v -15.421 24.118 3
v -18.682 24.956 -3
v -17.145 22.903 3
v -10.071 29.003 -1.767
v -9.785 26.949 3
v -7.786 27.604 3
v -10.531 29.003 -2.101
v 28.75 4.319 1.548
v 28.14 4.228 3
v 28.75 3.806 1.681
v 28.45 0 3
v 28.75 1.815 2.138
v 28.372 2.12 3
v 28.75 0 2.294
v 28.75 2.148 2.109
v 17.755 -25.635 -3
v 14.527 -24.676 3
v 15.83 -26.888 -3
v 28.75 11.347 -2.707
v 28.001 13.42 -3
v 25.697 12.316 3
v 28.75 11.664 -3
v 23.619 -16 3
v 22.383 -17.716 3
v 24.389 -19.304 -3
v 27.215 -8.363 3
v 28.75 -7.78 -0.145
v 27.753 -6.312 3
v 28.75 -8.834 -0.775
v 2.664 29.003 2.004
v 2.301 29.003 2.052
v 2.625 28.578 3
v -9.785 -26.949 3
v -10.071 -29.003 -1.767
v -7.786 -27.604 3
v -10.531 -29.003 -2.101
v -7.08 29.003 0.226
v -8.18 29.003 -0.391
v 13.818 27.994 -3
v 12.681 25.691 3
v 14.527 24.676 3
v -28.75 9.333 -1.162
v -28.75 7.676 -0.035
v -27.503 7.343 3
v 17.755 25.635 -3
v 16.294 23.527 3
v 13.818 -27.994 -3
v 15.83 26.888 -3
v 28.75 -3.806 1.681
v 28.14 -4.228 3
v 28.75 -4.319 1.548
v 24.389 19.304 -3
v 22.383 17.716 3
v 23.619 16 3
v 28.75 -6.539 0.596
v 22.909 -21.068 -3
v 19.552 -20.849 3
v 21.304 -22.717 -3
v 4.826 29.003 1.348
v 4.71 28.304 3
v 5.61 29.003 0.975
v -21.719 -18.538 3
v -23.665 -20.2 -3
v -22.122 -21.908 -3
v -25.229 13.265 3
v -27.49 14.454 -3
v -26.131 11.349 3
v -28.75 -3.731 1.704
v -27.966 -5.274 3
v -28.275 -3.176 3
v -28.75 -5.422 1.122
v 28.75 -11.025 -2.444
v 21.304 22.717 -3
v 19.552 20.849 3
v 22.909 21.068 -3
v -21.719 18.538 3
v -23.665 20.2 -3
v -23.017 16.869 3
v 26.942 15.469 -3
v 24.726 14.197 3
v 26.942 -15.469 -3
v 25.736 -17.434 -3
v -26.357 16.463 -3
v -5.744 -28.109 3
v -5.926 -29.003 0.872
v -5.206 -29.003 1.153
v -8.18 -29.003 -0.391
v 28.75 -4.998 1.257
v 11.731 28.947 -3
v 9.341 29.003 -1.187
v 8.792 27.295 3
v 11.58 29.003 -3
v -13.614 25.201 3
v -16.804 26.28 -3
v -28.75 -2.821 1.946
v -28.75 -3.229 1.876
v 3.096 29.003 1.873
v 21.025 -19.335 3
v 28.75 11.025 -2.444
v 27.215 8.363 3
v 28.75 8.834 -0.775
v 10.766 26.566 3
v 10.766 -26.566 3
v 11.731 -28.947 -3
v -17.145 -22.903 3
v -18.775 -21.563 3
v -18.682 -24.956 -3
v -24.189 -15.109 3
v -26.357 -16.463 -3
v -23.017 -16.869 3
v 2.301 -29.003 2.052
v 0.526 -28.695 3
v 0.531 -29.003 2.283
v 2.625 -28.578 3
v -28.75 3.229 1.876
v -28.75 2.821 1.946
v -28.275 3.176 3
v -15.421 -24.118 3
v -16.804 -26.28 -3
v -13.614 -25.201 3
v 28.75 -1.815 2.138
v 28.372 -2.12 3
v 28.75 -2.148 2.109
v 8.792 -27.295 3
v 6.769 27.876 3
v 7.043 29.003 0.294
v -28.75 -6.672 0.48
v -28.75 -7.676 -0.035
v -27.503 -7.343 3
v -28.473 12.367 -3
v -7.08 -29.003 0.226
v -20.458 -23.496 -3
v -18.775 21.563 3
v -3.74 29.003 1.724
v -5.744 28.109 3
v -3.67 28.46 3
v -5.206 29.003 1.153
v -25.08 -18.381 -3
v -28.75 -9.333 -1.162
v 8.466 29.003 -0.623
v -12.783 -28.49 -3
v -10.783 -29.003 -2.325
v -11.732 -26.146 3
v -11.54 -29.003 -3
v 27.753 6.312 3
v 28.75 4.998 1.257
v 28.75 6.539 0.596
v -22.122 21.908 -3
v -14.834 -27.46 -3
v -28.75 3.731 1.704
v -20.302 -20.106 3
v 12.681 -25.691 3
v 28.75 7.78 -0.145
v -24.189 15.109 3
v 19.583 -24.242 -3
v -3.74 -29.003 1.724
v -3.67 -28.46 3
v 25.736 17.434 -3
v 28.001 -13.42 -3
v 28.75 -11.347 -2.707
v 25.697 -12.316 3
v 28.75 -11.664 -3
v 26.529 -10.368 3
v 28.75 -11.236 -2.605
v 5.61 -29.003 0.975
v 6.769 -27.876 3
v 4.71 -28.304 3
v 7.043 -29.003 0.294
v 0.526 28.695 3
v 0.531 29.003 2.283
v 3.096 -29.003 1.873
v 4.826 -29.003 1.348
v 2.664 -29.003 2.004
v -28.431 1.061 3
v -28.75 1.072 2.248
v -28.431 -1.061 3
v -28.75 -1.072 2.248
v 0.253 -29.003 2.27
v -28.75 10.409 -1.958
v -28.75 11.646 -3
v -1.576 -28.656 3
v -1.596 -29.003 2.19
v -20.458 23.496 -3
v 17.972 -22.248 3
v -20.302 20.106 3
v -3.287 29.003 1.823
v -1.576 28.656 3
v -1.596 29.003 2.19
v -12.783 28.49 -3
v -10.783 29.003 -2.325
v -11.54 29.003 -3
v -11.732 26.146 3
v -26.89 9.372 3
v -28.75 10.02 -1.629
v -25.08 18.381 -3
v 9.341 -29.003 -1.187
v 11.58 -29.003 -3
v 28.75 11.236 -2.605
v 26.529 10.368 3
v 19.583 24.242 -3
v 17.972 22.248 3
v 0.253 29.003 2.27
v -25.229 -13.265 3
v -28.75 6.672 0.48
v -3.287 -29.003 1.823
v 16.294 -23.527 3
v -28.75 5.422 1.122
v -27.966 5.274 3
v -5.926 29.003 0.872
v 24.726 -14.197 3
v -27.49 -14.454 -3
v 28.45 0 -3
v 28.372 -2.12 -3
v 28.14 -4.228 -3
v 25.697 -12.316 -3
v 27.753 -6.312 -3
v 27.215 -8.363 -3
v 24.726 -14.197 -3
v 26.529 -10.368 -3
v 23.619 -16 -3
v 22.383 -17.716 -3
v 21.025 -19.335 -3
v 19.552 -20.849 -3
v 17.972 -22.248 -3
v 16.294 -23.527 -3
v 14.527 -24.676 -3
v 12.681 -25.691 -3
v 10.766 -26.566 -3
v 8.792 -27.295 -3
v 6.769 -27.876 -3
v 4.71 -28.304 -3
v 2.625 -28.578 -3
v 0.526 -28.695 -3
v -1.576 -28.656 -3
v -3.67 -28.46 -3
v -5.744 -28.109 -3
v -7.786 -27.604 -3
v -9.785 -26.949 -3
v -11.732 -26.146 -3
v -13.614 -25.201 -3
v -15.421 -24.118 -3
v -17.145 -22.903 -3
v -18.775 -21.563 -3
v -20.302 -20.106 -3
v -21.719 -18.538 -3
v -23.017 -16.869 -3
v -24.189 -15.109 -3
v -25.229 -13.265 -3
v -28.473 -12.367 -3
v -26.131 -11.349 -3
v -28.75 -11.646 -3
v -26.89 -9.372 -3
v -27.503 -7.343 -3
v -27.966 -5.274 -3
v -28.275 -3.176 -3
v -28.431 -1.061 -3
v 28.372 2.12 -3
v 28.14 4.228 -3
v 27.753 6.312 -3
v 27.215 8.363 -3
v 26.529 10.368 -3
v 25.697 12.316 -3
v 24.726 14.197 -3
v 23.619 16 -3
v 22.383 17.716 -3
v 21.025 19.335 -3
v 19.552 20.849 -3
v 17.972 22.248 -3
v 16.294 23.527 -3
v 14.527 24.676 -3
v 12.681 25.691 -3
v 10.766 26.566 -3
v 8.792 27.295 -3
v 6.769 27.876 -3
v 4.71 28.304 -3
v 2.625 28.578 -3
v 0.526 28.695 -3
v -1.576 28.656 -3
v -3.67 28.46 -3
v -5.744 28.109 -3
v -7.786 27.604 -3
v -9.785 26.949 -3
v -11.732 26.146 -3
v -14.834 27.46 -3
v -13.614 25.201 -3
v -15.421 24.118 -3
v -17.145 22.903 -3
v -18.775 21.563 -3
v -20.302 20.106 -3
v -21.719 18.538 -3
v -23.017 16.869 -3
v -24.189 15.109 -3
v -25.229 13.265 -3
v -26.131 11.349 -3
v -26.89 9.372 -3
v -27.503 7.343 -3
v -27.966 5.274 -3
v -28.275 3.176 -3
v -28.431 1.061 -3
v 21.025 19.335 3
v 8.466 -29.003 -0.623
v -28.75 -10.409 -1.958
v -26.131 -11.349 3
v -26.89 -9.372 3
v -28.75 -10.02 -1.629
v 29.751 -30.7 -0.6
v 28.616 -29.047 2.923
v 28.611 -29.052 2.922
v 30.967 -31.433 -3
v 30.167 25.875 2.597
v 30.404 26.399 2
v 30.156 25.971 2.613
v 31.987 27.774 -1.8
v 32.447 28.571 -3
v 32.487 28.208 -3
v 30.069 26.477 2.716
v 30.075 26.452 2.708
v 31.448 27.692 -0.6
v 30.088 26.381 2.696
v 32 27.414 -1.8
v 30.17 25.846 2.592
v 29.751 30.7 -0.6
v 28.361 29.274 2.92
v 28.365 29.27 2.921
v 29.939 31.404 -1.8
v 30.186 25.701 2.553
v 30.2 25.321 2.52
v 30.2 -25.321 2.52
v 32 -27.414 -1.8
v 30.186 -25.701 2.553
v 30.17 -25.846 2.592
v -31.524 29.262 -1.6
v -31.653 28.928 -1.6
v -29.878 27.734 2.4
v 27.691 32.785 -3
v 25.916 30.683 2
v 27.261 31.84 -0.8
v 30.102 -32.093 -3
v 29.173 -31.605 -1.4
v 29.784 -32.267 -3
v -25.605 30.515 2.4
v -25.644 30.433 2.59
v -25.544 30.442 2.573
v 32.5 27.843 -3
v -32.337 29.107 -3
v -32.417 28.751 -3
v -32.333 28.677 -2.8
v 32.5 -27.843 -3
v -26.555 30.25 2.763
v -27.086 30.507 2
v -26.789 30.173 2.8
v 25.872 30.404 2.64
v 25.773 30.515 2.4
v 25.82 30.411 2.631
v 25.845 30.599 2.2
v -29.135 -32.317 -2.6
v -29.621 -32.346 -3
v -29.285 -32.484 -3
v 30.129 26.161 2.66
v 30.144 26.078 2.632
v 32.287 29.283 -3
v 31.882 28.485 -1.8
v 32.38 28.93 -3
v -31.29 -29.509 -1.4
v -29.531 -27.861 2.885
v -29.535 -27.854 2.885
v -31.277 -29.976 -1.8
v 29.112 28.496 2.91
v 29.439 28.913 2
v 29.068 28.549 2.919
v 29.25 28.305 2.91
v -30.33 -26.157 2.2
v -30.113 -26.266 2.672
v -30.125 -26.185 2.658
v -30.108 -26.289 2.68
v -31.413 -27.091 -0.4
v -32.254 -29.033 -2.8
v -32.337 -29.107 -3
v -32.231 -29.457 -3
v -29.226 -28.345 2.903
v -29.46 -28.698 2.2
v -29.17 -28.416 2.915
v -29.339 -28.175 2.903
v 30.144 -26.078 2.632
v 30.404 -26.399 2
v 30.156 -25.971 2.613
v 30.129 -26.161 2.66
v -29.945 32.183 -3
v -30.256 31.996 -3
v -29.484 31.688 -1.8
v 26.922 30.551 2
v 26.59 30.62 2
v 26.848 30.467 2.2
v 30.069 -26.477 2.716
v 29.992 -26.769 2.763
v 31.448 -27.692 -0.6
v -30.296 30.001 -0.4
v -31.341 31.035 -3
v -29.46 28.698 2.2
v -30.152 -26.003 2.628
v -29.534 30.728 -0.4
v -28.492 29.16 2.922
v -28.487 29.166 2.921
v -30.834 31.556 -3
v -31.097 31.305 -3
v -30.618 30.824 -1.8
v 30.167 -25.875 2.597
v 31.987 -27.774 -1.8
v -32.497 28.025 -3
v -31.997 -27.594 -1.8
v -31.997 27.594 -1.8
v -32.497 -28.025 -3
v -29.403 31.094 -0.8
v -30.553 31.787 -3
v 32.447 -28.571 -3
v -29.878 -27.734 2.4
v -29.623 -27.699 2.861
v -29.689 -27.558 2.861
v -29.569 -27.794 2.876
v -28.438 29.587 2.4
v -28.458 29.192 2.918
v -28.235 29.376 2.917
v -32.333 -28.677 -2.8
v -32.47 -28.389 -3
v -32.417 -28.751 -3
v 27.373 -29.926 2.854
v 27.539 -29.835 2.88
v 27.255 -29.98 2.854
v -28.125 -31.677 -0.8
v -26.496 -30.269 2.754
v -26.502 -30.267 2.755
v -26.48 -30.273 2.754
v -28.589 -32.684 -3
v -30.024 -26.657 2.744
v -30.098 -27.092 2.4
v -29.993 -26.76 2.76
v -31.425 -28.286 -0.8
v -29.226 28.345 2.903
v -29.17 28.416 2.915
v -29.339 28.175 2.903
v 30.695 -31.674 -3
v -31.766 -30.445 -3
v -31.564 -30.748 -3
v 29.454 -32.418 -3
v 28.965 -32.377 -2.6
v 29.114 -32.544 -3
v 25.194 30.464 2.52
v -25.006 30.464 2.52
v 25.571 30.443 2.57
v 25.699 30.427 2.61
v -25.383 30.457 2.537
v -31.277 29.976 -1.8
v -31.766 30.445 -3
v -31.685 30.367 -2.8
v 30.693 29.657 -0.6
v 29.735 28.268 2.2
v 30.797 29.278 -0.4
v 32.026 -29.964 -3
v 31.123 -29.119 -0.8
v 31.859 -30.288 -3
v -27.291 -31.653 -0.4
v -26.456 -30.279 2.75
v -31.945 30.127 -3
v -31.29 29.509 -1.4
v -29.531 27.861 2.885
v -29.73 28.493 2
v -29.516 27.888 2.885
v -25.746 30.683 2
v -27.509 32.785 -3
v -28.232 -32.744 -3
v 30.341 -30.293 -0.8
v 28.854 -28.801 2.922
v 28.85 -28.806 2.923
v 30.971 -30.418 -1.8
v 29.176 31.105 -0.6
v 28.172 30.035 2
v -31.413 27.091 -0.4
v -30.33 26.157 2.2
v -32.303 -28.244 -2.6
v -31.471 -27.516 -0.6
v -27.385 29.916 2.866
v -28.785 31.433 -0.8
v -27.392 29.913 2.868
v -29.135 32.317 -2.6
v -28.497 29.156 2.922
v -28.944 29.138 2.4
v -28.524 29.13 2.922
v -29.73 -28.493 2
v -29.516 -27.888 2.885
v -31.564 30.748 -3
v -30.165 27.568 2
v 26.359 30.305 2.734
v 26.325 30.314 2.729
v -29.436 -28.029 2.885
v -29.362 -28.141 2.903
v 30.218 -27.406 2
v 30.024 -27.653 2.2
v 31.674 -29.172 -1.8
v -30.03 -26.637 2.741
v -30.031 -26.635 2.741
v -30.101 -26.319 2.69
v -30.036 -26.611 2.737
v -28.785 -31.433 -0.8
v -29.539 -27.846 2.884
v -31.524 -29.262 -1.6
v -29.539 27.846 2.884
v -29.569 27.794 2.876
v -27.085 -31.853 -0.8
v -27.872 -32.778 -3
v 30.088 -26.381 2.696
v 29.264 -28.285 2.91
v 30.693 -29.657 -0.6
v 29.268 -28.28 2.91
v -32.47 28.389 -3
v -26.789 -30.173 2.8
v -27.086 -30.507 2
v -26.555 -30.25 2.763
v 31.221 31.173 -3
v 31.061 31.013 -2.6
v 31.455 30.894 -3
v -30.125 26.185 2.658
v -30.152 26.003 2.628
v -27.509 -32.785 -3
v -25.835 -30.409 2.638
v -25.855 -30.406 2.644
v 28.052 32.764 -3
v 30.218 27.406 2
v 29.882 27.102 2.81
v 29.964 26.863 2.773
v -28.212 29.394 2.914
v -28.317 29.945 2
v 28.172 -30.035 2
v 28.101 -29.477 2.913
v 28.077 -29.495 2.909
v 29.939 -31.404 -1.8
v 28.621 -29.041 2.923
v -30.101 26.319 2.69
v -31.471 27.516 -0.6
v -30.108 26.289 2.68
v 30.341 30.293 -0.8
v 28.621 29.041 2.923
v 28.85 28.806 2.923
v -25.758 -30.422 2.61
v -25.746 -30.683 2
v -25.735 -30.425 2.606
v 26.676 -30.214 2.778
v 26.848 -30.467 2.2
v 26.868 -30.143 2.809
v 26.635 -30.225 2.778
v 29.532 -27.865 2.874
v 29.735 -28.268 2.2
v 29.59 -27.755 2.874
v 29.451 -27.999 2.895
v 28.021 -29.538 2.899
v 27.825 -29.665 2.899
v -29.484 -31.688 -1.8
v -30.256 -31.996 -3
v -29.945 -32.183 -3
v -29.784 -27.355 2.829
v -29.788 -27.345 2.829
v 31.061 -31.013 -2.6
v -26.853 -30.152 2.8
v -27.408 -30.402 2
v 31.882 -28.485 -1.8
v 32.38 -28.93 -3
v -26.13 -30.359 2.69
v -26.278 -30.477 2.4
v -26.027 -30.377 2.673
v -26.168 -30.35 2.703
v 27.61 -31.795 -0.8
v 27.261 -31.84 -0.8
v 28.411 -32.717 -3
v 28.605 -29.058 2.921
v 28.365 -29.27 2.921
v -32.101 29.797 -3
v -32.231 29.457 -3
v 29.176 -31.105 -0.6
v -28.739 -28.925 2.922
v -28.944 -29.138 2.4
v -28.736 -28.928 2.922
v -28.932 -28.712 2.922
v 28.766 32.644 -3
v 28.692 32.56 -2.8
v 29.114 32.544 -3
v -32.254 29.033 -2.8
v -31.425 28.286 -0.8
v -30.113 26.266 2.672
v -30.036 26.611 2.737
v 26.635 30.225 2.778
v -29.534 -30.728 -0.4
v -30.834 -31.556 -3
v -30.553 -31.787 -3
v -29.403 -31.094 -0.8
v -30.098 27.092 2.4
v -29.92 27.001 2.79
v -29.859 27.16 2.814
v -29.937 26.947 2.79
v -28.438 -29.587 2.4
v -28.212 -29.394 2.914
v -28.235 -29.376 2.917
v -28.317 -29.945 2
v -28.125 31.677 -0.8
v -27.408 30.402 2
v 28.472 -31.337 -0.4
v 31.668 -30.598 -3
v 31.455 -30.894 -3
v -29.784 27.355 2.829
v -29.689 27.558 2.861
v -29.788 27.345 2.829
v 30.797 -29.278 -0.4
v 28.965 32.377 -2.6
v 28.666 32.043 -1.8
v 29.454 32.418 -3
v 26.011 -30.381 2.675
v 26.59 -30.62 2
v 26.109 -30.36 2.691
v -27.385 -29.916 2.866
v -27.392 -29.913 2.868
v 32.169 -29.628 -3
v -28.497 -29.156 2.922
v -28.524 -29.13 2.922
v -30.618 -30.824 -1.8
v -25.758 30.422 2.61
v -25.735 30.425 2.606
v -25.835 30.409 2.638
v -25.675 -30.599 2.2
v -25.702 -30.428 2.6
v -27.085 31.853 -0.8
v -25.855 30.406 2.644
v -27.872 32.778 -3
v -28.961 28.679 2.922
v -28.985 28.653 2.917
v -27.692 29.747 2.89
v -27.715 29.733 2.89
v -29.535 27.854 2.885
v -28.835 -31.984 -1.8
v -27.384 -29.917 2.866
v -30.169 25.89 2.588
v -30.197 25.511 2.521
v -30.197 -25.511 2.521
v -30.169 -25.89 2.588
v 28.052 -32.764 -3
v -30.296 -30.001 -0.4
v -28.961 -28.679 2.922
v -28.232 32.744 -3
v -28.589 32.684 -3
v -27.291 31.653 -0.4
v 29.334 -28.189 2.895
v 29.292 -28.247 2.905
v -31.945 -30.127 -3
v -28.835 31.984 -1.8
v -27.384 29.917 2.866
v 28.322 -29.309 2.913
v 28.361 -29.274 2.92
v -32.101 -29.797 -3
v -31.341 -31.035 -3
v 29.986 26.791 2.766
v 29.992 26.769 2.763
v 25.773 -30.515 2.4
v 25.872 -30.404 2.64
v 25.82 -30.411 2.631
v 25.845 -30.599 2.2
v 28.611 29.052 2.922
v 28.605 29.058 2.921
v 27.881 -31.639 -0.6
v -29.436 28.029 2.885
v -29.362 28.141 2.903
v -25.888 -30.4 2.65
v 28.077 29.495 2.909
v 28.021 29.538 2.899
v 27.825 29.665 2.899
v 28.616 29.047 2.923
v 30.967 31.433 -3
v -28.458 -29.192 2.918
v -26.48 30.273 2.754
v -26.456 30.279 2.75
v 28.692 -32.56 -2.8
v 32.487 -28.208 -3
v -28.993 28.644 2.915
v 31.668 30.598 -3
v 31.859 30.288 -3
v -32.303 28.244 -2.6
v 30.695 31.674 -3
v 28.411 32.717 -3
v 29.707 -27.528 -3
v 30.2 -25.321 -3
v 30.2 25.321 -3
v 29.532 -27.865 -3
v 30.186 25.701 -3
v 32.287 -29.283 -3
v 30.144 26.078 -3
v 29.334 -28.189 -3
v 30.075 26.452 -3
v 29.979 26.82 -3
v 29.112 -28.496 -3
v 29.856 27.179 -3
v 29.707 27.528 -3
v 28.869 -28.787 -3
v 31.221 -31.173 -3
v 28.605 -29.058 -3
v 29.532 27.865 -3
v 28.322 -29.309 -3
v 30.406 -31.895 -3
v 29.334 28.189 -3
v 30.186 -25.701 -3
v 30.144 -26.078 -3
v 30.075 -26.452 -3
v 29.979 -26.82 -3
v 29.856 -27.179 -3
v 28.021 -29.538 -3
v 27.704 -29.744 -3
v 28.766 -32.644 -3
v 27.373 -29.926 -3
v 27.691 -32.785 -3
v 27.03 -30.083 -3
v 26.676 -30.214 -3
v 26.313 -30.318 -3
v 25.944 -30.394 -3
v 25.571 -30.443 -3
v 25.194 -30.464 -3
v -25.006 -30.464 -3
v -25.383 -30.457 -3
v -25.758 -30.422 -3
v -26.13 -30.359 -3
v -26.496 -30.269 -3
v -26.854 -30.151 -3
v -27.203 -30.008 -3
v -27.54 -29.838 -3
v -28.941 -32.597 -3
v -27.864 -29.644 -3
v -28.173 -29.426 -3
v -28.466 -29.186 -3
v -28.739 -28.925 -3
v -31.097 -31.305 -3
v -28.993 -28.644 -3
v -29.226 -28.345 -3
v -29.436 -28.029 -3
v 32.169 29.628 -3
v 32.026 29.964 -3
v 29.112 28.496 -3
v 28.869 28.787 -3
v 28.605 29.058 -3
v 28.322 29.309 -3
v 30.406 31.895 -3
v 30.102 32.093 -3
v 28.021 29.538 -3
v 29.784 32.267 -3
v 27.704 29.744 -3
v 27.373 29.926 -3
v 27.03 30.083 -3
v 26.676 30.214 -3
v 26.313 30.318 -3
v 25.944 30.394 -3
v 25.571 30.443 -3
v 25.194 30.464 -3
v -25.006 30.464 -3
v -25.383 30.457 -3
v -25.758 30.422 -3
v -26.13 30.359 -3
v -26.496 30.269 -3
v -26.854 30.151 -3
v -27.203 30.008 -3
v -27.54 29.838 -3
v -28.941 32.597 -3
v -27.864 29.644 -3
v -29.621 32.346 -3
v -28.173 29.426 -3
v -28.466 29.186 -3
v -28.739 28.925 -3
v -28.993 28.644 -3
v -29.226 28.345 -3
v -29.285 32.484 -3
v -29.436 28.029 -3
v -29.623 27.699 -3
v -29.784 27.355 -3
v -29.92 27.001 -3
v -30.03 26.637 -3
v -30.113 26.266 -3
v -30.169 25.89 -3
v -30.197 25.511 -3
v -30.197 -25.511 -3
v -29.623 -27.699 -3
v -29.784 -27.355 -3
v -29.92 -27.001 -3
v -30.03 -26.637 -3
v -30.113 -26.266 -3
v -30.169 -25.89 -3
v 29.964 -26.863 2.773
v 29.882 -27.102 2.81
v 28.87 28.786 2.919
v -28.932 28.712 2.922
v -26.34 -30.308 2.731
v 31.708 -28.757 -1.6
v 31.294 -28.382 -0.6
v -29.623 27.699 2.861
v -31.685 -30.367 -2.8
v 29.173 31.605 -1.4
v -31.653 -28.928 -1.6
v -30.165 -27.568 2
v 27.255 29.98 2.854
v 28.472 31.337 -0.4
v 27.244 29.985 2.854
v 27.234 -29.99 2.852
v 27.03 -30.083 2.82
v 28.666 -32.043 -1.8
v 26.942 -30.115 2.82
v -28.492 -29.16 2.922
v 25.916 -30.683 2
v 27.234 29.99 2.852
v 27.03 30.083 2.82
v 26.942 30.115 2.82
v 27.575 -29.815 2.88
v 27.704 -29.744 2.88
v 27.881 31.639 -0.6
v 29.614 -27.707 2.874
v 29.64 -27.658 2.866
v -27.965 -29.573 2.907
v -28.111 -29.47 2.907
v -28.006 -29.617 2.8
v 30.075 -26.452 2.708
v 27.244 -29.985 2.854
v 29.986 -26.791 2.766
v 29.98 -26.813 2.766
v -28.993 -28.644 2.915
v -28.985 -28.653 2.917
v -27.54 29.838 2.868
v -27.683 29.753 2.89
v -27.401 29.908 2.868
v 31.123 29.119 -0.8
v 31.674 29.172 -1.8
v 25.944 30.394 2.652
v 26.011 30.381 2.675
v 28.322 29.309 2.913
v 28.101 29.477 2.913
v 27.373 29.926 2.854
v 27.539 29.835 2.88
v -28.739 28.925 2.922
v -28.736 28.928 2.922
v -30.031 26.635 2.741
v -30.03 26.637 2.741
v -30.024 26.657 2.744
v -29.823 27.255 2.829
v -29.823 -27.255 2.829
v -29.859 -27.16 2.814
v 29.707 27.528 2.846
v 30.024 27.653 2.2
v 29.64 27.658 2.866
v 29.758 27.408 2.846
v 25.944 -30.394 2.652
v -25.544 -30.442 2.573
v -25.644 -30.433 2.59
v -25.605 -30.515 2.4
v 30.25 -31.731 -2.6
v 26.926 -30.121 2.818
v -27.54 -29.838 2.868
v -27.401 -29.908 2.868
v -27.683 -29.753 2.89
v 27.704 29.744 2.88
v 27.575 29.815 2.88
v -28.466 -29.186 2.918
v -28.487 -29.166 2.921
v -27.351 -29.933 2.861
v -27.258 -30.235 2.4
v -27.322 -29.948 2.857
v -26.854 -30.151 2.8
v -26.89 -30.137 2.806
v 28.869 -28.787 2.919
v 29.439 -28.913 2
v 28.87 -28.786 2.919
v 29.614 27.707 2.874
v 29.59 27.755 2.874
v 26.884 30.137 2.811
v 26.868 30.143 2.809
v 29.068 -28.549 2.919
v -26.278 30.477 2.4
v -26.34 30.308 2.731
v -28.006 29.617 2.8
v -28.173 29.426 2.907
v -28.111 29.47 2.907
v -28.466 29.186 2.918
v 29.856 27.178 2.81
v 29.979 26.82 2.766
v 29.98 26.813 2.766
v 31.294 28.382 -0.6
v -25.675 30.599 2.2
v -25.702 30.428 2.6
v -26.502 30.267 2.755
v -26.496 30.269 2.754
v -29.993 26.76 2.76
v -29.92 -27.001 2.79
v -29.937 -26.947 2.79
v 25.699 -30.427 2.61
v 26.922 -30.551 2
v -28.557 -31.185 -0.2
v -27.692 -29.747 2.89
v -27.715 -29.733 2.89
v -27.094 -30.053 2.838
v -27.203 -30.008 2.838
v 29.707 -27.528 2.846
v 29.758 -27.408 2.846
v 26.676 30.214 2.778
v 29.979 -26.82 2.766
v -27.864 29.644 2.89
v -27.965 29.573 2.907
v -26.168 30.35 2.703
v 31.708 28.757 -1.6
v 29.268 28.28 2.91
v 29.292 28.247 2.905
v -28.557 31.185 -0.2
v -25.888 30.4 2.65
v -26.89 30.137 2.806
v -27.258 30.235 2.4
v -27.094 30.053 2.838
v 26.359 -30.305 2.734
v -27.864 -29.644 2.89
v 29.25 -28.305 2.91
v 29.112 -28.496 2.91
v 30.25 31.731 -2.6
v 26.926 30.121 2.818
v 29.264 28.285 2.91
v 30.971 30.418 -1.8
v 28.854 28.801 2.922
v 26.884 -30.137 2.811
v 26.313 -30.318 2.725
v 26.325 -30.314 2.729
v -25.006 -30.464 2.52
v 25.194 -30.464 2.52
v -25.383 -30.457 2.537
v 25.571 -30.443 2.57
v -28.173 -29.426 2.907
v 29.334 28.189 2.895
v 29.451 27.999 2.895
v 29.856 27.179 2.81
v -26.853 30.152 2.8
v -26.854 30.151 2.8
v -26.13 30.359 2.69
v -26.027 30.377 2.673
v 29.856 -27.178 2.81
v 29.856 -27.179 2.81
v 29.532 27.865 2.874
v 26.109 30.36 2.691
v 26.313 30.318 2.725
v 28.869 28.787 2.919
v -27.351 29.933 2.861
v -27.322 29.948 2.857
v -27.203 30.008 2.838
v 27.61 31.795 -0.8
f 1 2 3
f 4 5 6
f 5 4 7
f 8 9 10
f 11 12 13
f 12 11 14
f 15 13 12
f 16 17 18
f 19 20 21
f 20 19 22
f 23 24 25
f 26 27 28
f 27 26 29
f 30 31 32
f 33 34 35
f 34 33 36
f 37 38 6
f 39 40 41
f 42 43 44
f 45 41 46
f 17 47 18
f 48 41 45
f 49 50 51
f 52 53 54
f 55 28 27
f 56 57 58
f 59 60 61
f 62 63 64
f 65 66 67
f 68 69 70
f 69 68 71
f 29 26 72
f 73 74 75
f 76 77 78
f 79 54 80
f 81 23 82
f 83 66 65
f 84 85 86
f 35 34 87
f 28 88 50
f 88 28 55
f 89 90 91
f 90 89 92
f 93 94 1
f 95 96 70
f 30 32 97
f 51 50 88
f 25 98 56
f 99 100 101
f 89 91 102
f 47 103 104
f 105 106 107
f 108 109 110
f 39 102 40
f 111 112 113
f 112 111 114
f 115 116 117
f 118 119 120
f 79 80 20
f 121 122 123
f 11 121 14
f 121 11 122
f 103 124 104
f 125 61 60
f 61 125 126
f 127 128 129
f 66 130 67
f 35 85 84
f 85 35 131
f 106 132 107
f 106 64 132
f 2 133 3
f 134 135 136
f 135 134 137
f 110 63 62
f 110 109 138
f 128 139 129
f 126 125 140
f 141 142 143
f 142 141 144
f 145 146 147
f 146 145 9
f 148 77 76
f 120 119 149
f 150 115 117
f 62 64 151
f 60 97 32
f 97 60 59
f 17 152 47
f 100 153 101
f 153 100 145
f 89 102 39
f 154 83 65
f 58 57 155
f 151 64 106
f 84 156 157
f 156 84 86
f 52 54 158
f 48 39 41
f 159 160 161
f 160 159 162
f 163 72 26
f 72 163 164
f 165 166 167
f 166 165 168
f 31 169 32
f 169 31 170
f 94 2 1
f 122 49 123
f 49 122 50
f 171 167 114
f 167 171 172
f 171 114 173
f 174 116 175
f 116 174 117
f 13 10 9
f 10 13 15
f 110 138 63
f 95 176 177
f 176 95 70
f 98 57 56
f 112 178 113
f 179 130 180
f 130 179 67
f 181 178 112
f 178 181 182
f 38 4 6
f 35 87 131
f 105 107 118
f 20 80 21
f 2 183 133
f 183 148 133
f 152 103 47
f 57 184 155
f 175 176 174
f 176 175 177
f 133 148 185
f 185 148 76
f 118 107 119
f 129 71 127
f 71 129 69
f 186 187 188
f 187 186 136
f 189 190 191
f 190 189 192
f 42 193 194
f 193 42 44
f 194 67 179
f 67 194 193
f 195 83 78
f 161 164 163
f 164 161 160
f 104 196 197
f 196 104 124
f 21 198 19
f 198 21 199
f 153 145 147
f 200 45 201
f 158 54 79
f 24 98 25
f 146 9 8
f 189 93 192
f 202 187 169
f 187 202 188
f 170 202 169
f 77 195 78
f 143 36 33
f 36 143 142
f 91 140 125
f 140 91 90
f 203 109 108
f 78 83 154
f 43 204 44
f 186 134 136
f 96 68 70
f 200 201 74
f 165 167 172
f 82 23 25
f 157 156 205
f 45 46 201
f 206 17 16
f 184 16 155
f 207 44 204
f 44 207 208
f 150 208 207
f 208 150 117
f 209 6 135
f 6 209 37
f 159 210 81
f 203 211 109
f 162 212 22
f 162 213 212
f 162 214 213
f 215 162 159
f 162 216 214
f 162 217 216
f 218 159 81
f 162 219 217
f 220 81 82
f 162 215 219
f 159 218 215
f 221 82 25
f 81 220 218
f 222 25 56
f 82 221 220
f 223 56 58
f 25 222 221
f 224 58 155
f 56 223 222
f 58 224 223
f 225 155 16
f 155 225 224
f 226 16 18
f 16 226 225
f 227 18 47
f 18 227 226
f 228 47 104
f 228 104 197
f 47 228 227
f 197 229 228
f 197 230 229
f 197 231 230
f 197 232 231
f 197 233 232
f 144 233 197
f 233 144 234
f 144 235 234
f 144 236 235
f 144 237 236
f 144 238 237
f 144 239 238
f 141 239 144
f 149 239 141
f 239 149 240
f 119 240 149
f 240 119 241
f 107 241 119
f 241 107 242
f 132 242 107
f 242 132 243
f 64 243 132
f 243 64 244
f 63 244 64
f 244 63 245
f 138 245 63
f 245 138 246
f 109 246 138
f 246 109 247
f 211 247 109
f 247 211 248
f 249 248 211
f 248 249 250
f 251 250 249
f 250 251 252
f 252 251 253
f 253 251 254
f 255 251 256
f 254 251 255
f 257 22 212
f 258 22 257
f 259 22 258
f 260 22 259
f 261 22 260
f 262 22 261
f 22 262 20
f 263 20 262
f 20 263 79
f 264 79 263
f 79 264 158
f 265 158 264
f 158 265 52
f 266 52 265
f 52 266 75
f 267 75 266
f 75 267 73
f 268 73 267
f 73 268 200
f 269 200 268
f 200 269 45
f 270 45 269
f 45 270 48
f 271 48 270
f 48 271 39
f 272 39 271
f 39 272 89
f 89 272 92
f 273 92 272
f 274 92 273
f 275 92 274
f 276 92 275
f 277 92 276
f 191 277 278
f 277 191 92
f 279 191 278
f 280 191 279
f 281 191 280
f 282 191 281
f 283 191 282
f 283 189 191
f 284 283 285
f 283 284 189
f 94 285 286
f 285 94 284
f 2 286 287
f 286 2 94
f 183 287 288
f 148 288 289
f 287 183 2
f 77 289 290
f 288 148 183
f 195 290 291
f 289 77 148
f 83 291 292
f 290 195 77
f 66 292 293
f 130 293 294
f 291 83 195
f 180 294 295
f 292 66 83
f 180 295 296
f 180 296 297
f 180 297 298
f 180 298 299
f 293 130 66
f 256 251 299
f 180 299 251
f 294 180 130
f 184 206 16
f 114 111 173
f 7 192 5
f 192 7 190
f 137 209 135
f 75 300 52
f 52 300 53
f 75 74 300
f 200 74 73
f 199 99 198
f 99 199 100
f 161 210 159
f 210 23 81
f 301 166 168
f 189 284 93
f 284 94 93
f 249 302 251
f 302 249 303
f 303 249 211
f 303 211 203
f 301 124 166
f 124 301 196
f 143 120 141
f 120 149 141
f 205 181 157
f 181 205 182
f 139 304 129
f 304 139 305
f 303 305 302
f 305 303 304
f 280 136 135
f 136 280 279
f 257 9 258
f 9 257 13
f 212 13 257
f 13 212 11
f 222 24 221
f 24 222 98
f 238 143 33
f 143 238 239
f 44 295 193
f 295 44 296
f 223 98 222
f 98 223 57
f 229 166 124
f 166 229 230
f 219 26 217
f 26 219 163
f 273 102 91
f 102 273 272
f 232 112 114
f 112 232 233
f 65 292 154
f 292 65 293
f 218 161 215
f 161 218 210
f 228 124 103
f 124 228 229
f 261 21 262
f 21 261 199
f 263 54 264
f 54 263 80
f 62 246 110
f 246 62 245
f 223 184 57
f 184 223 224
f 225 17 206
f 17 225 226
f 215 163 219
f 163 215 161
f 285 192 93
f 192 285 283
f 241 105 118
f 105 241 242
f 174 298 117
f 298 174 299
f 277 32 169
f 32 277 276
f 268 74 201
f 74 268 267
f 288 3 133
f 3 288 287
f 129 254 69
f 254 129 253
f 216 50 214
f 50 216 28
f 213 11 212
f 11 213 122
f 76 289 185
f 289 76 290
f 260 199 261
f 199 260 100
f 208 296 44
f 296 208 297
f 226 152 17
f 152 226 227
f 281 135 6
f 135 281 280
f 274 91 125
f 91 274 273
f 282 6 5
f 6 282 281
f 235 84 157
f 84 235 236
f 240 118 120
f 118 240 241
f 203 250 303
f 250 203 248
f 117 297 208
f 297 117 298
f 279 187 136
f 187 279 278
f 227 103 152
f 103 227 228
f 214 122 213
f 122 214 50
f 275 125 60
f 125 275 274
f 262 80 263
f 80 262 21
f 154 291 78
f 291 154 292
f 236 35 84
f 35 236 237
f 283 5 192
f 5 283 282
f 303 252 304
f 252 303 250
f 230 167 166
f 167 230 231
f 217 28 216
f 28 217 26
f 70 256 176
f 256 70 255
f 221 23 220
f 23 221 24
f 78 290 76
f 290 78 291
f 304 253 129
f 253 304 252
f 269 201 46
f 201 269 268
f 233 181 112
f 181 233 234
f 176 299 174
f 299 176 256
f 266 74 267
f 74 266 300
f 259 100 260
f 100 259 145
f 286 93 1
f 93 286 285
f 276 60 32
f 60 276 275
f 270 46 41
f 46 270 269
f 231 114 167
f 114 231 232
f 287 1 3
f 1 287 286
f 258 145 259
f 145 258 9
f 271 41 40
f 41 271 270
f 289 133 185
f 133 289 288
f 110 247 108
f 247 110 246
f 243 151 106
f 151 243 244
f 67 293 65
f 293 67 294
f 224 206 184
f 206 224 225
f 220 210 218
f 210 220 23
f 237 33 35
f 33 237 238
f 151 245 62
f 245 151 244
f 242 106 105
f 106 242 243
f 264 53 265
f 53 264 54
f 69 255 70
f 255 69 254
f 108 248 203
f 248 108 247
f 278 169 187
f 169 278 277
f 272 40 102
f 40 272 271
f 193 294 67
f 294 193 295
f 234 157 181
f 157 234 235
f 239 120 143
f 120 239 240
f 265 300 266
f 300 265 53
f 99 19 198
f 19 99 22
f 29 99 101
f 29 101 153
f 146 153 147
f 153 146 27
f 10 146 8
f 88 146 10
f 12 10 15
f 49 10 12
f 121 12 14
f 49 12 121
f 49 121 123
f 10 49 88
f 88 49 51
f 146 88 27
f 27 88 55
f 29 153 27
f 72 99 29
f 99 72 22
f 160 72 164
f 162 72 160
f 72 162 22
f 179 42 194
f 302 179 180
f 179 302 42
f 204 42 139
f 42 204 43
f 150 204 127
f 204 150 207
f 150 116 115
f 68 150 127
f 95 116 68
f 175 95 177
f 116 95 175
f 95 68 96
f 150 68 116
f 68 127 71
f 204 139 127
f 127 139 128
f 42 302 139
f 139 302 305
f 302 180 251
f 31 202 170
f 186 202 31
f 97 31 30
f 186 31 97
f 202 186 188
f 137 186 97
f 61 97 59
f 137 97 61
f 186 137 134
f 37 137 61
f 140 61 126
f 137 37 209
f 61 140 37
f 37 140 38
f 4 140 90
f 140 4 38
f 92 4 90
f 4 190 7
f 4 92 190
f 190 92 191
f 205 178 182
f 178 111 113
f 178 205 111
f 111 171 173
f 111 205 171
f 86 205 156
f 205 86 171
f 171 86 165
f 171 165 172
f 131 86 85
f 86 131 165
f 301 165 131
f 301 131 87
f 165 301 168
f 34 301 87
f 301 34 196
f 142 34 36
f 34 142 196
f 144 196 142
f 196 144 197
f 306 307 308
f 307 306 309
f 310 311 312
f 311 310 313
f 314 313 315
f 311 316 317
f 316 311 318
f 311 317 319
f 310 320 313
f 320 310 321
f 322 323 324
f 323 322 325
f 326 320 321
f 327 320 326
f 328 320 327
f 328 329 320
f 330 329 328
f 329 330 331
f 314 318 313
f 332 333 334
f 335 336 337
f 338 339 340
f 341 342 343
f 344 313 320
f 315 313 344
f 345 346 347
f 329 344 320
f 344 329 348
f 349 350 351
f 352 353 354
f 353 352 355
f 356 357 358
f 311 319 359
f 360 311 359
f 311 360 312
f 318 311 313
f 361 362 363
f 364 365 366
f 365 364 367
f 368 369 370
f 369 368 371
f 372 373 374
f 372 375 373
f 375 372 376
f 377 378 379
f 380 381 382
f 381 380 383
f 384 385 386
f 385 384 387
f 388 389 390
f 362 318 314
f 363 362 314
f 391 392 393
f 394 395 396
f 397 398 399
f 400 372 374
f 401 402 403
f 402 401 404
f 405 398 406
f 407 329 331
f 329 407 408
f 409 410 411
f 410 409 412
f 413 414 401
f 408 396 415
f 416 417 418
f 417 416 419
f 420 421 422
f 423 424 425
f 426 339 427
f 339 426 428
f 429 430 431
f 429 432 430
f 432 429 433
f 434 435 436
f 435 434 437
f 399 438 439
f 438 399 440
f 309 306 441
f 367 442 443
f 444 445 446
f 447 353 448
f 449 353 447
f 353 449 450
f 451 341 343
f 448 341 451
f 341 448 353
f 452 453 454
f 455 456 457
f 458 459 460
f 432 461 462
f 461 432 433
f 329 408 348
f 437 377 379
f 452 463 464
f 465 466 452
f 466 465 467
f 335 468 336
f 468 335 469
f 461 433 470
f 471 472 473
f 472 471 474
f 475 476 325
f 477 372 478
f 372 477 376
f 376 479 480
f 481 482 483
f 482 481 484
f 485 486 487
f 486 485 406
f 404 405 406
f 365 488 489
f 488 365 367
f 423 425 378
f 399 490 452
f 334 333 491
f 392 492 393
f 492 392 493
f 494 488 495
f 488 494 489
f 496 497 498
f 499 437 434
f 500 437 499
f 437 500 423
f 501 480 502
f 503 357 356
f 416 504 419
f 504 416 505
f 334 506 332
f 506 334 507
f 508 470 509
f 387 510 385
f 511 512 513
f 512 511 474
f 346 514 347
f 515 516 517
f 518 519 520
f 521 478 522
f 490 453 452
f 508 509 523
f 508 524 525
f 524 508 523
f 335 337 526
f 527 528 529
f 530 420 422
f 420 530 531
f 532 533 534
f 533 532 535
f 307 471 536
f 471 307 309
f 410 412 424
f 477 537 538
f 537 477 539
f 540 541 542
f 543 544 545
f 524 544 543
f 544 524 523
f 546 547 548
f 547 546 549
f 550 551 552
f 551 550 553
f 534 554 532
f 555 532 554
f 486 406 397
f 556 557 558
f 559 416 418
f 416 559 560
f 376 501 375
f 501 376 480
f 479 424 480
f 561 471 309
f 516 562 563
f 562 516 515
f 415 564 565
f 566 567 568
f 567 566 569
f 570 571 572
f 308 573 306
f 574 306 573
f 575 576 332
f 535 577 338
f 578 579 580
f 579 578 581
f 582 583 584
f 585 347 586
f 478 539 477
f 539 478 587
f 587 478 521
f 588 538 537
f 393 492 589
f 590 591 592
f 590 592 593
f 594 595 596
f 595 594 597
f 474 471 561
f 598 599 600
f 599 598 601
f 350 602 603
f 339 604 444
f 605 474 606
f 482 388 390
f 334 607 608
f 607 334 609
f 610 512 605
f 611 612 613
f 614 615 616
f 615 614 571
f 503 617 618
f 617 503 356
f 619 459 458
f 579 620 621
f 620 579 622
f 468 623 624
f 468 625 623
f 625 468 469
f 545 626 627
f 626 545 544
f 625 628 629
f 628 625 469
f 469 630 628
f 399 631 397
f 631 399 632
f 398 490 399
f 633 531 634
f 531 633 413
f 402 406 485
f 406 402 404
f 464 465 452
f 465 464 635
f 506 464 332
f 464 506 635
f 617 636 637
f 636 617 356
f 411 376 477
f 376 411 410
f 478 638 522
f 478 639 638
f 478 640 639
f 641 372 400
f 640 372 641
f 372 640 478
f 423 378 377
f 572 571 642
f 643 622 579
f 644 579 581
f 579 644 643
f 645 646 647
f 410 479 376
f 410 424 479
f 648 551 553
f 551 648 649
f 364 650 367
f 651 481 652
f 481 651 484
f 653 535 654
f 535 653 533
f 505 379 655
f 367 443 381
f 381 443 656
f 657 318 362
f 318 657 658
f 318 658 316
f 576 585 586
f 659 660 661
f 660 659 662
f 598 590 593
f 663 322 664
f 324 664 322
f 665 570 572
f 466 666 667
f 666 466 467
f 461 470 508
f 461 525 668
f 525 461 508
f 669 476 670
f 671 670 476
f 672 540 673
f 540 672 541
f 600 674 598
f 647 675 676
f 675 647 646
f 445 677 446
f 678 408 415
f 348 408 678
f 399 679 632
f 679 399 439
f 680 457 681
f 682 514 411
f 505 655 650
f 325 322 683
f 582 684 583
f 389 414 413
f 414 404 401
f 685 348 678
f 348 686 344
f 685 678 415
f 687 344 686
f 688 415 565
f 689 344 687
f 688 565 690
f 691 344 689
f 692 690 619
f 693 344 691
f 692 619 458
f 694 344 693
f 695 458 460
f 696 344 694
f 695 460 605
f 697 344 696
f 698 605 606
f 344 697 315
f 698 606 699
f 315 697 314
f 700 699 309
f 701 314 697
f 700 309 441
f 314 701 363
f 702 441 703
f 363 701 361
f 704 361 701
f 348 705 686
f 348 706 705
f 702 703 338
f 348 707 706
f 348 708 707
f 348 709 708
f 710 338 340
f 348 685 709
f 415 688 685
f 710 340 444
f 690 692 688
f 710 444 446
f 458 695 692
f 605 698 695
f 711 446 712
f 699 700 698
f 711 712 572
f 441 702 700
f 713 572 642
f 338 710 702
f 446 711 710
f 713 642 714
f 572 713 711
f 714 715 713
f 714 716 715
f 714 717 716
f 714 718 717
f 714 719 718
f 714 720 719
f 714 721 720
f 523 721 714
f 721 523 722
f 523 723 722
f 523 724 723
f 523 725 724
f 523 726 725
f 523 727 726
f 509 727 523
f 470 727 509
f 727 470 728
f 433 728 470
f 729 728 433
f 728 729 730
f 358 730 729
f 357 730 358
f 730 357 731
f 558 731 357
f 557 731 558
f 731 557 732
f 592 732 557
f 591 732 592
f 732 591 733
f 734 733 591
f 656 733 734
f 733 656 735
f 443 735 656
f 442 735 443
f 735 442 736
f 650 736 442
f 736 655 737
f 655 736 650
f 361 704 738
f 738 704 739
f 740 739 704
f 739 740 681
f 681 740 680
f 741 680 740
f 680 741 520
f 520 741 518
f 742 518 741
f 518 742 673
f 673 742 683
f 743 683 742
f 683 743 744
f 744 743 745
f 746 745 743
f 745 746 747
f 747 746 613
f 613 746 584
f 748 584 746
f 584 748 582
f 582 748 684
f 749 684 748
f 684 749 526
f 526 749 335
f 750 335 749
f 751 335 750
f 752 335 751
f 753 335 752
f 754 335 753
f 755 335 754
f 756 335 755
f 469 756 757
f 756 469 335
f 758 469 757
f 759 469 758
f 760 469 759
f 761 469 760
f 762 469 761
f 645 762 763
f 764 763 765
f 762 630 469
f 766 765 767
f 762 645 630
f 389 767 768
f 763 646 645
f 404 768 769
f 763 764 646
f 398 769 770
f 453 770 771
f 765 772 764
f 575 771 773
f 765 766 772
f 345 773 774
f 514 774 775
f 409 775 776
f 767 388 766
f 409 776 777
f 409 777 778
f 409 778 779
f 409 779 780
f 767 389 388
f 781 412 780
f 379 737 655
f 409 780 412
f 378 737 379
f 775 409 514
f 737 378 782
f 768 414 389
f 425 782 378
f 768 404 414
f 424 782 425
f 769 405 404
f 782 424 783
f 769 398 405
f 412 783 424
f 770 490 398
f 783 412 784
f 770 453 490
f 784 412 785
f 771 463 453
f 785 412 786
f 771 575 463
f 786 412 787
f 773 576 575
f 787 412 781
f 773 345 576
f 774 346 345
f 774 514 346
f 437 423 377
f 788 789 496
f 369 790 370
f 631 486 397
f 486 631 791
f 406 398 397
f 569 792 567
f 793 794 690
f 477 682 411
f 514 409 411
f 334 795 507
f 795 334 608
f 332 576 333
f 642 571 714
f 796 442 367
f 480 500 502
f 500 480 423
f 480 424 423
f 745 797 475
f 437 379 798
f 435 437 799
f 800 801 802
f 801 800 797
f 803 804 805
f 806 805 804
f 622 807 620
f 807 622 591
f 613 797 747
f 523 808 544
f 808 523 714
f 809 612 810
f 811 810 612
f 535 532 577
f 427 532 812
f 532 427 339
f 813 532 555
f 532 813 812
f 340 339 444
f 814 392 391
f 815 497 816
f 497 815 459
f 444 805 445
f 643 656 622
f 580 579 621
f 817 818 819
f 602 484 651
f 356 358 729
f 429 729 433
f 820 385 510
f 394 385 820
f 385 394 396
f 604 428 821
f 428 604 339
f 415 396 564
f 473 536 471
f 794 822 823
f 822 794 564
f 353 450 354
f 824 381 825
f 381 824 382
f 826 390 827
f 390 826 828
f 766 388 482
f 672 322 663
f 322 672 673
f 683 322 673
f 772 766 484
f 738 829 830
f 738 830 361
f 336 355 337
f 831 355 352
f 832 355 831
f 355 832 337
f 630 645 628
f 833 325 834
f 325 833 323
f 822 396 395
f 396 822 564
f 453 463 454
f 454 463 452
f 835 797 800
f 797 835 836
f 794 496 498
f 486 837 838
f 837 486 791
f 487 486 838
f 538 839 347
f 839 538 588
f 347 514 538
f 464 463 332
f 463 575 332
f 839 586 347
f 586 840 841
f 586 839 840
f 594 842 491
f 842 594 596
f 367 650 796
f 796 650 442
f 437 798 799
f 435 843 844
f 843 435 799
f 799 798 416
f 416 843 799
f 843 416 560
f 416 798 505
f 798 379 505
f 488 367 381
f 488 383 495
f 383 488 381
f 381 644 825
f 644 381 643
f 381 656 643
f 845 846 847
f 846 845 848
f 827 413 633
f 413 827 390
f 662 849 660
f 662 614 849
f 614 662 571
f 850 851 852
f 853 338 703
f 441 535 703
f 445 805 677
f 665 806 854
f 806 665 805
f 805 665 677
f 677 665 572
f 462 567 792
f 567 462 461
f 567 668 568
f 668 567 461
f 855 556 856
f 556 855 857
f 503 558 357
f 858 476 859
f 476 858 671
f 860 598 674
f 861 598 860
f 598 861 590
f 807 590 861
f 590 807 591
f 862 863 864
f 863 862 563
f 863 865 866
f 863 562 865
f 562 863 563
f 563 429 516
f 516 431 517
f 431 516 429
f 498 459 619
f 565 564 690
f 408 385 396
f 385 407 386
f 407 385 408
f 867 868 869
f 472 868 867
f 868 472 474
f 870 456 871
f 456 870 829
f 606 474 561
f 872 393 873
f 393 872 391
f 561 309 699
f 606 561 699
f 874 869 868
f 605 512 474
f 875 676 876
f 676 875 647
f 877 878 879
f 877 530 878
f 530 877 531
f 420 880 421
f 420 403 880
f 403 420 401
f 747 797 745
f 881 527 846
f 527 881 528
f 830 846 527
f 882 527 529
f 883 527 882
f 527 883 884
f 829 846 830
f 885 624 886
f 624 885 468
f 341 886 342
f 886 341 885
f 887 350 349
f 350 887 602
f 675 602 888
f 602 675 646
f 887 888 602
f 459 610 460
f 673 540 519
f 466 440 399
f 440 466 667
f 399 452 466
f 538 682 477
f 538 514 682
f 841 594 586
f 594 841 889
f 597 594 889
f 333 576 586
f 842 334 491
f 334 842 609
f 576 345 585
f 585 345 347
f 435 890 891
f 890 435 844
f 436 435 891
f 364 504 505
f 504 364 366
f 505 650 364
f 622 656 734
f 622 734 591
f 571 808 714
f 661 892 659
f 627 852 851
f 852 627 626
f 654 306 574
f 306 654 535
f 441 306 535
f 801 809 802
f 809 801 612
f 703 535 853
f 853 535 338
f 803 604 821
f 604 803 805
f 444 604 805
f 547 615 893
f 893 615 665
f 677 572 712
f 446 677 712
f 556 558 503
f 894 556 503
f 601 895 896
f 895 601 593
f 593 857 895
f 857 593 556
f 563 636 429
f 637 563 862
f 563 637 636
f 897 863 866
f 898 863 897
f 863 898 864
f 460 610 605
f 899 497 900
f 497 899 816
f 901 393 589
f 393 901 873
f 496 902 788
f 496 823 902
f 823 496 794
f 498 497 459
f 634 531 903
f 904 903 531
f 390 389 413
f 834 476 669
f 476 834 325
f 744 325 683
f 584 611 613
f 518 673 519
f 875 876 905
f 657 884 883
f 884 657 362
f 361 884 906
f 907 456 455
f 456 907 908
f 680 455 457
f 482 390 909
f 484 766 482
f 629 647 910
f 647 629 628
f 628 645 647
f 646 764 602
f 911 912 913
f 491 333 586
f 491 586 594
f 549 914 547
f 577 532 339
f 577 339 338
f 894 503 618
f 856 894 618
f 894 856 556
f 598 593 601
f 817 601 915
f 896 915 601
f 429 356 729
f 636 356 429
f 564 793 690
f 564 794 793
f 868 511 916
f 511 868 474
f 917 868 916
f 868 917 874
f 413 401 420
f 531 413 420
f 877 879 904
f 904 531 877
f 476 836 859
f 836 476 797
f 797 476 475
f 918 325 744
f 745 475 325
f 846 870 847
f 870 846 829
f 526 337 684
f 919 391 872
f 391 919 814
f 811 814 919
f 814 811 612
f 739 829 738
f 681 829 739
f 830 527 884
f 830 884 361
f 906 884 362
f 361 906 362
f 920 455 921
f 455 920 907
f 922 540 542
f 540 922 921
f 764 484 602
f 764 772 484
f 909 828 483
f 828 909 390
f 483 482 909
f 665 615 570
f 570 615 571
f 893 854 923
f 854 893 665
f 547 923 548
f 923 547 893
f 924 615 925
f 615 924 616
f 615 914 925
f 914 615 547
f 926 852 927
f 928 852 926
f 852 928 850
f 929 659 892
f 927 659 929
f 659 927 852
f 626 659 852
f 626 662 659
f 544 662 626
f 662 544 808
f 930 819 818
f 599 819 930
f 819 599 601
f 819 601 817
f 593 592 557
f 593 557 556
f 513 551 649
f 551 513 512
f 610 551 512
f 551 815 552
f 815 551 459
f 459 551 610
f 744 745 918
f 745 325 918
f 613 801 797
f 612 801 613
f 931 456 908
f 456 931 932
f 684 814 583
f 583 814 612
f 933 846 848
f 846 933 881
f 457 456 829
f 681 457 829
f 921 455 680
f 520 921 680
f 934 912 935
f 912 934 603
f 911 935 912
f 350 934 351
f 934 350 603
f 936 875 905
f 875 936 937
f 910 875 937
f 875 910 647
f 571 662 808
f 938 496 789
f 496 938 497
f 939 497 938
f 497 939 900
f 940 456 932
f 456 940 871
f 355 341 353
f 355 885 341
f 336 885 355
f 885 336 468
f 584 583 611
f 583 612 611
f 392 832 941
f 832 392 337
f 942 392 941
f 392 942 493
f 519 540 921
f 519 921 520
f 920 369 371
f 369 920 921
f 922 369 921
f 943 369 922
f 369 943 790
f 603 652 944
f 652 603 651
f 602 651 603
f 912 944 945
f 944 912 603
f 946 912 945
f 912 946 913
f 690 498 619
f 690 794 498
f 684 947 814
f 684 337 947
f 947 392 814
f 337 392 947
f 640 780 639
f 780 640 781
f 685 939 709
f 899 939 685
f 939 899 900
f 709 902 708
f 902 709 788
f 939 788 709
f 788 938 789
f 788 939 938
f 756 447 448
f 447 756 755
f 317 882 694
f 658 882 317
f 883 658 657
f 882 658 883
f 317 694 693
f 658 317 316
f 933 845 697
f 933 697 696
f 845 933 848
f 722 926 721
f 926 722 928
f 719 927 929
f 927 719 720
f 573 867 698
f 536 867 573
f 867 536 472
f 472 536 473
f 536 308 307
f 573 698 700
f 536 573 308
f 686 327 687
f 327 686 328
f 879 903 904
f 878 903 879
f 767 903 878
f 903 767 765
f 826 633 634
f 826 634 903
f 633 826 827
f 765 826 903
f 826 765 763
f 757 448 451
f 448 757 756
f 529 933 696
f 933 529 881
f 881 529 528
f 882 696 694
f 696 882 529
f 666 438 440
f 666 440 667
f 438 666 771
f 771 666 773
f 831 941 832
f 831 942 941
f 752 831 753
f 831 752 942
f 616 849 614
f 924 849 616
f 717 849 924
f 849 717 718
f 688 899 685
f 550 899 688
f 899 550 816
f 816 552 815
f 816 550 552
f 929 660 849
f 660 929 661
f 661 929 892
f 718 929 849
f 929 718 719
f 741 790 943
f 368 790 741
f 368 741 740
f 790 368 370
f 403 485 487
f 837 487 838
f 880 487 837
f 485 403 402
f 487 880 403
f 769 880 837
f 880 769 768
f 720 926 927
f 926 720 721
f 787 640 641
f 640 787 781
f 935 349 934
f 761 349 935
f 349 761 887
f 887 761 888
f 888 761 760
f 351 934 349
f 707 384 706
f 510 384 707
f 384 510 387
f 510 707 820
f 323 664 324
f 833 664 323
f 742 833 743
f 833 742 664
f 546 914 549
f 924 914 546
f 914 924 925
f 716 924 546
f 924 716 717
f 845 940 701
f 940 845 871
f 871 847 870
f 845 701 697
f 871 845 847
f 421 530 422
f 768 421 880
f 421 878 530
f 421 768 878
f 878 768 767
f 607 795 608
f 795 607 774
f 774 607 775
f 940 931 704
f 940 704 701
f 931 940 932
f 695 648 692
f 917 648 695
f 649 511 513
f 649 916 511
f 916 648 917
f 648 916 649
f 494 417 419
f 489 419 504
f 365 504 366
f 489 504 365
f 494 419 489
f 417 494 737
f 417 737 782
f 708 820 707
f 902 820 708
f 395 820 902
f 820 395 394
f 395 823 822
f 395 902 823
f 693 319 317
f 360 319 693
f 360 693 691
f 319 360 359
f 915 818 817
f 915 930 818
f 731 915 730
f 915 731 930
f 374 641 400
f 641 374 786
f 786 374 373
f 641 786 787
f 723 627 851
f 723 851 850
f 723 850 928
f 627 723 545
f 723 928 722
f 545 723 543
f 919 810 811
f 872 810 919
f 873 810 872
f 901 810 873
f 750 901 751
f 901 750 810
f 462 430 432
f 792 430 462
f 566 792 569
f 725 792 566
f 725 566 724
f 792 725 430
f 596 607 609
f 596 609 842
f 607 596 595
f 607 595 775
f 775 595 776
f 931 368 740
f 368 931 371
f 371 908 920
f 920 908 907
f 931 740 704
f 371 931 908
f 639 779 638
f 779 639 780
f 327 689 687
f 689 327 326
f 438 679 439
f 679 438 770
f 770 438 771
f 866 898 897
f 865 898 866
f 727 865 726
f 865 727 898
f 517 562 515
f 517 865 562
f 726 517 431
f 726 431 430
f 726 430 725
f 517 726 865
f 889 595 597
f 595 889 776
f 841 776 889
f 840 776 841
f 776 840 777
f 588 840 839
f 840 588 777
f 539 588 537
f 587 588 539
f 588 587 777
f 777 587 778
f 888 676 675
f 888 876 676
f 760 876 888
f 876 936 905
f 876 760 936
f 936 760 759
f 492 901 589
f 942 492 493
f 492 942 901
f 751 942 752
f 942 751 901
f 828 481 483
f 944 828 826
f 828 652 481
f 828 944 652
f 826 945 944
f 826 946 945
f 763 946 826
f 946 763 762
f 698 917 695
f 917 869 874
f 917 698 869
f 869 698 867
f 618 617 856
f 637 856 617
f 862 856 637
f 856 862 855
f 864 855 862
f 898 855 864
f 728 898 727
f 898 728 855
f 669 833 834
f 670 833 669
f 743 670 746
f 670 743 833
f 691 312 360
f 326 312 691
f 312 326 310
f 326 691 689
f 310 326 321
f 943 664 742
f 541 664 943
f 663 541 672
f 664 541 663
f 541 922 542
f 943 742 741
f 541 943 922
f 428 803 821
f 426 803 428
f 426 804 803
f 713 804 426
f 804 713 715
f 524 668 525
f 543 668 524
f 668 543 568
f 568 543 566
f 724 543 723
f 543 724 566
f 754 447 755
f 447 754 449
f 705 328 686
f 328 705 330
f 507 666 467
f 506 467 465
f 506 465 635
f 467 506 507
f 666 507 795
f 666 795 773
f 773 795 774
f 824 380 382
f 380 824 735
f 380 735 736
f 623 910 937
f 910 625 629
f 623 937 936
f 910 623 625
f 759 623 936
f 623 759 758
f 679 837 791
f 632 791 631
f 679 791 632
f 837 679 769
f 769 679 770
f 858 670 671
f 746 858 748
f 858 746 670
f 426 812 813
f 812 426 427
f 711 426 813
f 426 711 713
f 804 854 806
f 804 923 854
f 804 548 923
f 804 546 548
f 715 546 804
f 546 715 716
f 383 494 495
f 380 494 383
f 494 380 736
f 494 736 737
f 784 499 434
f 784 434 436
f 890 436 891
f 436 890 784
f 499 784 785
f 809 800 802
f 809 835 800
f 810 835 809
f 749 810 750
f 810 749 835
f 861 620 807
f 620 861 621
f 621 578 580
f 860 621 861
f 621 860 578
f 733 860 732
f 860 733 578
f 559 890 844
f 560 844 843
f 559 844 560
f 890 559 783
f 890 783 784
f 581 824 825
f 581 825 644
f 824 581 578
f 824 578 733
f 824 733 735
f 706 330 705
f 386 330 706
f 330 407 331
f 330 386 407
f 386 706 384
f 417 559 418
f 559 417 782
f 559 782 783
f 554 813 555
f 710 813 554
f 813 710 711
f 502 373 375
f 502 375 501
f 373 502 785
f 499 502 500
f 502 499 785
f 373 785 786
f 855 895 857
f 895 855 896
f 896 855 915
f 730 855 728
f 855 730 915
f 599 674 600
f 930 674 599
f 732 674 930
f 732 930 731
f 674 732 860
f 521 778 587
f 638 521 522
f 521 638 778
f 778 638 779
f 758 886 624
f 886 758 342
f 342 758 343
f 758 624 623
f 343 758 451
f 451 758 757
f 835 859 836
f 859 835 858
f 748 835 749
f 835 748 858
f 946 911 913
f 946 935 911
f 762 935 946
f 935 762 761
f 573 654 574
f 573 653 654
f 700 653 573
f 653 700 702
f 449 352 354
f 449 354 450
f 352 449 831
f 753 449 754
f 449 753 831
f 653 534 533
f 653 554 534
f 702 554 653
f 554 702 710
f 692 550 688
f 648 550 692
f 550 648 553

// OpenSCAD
blades=56.9; //55.8
roundwall=57.36; //min measure, varies wider near corners
coneheight=6;
cubeout=60; //59.98
cubein=57.5;  //56.77
conebase = 62;
walls = 1.2;
house_corner = 9.8;
//after printing the first copy, if bad fit, adjust below
//actual_size = blades;
actual_size = blades; // after print, measured diameter of printed fan-blade hole (for scale-up-or-down)

module volcano(inside=blades, based=conebase, ht=coneheight){
	difference(){
		difference(){
			cylinder(r1=based/2, r2=inside/2, h=ht, center=true, $fn=85);
 			cylinder(r=inside/2, h=ht+.1, center=true, $fn=85);
		}
		difference(){
			cube([based+1,based+1,ht+.1], center=true);
			cube([cubein, cubein, ht+.1], center=true);
		}
	}
}

module fan_house_inset(interior=cubeout - house_corner, exterior=65, corner_rad=house_corner/2){
	// interior is for use with minkowski to get outside profile of fan-housing cut-out
	difference(){
	// first make the solid tapered outside
		linear_extrude(height = coneheight, center = true, convexity = 10, twist = 0, slices = 30, scale = cubeout/exterior){
			minkowski(){
				square([exterior-house_corner, exterior-house_corner], center=true);
				circle(r=house_corner/2, $fn=85);
				}
		}
		// next take away the interior
		minkowski(){
			cube([interior, interior, 25], center=true);
			cylinder(r=corner_rad+.2, h=.01, $fn=85);
		}
	}
}

module fanterface (){
	scale([(blades)/actual_size, (blades+.5)/actual_size, 1])
		volcano();

	scale([(blades)/actual_size, (blades+.5)/actual_size, 1])
	fan_house_inset();
}

fanterface();
